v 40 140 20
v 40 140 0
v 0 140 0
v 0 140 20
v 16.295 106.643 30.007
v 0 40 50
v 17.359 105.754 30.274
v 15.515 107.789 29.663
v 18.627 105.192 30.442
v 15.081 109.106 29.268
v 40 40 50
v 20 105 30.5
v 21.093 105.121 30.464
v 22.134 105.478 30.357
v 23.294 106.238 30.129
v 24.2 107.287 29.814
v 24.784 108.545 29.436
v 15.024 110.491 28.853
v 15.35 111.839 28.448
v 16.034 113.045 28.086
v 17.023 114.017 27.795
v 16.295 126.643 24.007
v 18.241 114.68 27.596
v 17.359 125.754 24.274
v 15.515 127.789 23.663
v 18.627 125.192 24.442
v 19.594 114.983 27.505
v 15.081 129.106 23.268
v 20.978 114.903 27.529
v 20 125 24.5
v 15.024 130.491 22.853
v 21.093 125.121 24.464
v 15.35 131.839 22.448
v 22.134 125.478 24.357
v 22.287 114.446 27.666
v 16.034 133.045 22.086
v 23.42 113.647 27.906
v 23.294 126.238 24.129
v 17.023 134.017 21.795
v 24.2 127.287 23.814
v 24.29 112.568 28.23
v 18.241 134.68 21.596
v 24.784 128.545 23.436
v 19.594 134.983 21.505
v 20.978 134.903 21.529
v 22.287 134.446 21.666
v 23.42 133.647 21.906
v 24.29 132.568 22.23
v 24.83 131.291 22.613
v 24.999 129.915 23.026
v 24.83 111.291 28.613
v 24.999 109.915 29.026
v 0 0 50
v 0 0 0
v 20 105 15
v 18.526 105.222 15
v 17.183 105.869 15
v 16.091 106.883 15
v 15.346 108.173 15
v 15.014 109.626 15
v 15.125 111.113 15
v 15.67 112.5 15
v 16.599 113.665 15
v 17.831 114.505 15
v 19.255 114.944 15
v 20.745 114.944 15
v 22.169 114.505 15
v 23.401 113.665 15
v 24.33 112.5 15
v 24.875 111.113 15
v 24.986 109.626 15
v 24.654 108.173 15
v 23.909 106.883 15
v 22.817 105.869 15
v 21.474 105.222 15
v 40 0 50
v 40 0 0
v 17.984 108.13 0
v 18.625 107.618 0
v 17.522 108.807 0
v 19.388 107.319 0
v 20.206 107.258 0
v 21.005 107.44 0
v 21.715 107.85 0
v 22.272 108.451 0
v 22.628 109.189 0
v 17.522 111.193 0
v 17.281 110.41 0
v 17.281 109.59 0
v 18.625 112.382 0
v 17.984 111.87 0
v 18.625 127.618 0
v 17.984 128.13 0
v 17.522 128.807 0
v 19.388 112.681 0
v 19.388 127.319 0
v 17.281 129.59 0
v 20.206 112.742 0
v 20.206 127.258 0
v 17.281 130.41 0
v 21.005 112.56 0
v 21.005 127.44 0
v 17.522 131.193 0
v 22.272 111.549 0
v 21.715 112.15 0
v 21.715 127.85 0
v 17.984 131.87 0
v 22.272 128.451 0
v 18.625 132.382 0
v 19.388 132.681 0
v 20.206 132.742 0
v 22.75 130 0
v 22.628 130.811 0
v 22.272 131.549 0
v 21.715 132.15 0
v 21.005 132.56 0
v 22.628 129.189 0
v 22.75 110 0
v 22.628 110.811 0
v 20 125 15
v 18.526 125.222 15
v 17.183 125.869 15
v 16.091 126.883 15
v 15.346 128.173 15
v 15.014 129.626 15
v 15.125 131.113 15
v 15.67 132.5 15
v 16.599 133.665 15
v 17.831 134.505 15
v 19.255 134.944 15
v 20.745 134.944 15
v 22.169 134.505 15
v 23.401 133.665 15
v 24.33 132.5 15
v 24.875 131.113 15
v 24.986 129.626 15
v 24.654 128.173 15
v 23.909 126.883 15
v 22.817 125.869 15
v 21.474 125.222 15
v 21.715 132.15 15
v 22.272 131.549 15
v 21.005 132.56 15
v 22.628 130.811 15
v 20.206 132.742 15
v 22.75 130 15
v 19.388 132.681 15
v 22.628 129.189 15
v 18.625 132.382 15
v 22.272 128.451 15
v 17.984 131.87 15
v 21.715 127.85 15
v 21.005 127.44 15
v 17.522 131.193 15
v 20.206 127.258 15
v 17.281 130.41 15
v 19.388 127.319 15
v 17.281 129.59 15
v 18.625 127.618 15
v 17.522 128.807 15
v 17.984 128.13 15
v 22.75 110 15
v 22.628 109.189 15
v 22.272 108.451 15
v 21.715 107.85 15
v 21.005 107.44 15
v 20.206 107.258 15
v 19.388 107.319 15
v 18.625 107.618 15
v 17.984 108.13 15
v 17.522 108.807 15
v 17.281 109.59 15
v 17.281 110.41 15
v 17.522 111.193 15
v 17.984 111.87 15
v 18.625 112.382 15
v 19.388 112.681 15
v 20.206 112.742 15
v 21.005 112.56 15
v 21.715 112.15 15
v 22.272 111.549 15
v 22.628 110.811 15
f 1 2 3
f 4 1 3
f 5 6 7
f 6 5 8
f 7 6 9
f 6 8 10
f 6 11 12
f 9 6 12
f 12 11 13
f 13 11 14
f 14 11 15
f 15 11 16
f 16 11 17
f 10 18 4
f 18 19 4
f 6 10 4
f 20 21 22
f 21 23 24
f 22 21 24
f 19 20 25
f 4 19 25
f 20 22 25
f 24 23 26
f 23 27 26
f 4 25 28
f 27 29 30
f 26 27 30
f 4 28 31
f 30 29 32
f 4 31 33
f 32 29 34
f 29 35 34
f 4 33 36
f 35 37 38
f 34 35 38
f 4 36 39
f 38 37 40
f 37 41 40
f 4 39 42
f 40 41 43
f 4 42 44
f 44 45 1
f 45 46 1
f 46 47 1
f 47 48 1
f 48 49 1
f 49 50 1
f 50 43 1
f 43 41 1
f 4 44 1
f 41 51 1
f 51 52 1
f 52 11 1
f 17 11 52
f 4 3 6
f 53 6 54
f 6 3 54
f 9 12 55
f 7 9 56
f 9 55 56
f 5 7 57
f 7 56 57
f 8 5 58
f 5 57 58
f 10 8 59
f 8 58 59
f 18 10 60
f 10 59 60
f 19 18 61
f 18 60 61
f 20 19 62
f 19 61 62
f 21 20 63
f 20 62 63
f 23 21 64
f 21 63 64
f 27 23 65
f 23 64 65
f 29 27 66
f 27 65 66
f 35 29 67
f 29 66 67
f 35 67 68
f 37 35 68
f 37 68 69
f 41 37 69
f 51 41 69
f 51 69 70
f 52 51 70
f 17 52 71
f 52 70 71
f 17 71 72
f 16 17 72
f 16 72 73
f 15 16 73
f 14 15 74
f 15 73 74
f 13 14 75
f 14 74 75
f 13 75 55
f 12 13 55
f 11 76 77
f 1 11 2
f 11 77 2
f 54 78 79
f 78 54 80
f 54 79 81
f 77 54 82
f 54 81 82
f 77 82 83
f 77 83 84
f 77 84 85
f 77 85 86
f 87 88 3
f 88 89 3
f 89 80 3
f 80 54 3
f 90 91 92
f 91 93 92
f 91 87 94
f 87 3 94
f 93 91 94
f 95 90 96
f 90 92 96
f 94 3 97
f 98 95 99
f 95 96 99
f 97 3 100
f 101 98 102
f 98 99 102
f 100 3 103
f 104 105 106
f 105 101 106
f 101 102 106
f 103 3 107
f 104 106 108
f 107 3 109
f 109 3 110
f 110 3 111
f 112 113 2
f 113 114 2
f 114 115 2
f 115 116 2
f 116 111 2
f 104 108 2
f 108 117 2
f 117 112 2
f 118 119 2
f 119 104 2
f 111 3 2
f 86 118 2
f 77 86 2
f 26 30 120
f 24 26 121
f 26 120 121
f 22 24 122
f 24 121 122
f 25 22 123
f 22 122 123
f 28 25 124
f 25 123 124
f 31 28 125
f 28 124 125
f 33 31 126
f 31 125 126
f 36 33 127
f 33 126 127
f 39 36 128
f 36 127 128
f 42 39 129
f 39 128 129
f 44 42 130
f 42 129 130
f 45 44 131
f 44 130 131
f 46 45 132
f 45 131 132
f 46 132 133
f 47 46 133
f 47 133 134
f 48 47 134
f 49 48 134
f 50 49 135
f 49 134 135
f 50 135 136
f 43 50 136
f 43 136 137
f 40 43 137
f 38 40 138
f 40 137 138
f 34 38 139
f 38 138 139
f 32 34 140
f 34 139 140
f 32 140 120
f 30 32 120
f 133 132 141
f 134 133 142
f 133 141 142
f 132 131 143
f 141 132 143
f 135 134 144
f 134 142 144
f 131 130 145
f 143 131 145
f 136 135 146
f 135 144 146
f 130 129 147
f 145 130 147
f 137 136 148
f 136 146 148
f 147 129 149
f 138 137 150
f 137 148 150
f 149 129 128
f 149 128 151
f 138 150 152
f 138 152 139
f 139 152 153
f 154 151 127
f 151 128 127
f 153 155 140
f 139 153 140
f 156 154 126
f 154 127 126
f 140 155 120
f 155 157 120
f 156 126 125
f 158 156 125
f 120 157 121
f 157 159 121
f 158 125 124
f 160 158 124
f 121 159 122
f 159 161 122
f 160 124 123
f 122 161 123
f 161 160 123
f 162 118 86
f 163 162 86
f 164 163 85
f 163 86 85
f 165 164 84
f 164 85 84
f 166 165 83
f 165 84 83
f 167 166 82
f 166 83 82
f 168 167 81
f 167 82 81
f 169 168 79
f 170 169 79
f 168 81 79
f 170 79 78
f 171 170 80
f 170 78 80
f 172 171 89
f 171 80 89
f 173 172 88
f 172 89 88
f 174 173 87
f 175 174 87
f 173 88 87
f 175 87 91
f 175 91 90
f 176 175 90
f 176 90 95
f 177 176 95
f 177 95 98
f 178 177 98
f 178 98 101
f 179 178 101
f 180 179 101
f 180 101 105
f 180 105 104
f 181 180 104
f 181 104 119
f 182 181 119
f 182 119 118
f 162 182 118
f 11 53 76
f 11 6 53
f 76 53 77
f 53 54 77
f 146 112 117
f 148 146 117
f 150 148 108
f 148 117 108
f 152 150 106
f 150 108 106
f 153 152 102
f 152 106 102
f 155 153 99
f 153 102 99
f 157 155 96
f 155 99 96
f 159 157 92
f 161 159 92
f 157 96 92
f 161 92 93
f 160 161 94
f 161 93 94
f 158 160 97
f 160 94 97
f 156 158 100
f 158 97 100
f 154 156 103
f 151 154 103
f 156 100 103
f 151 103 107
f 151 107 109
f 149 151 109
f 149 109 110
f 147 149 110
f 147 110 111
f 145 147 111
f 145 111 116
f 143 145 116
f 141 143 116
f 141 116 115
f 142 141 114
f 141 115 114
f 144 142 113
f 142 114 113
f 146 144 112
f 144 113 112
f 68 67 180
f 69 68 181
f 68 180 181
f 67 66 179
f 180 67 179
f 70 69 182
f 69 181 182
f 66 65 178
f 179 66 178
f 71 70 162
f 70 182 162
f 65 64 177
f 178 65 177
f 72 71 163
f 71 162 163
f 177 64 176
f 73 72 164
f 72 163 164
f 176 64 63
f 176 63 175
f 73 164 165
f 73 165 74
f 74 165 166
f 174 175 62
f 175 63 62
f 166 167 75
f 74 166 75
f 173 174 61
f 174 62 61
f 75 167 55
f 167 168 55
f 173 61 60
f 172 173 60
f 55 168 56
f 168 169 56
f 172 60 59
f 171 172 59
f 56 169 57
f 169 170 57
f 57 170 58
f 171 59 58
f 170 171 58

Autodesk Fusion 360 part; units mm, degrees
sketch "Sketch1" plane through (0, 0, 0) normal (0, 0, 1) x (1, 0, 0)
  line L0 (0, 0) -> (40, 0)
  line L1 (40, 0) -> (40, 140)
  line L2 (40, 140) -> (0, 140)
  line L3 (0, 140) -> (0, 0)
  circle A0 centre (20, 130) radius 2.75
  circle A1 centre (20, 110) radius 2.75
  dimension "d1" = 40
  dimension "d2" = 140
  dimension "d3" = 5.5
  dimension "d4" = 20
  dimension "d5" = 10
  dimension "d6" = 5.5
  dimension "d7" = 20
  dimension "d8" = 20
extrude "Extrude1" add sketch "Sketch1" along normal blind 50
hole "Hole1" at (20, 130, 50) direction (0, 0, -1) diameter 10 depth 35 tip angle 180
hole "Hole2" at (20, 110, 50) direction (0, 0, -1) diameter 10 depth 35 tip angle 180
sketch "Sketch2" plane through (40, 0, 0) normal (1, 0, 0) x (0, 0, -1)
  line L0 (0, 0) -> (0, 140)
  line L1 (0, 140) -> (-50, 140)
  line L2 (-50, 140) -> (-50, 0)
  line L3 (-50, 0) -> (0, 0)
  line L4 (-50, 140) -> (-20, 140)
  line L5 (-50, 140) -> (-50, 40)
  line L6 (-50, 40) -> (-20, 140)
extrude "Extrude2" cut sketch "Sketch2" against normal blind 40 contours L1 L2 L4 L5 L6
